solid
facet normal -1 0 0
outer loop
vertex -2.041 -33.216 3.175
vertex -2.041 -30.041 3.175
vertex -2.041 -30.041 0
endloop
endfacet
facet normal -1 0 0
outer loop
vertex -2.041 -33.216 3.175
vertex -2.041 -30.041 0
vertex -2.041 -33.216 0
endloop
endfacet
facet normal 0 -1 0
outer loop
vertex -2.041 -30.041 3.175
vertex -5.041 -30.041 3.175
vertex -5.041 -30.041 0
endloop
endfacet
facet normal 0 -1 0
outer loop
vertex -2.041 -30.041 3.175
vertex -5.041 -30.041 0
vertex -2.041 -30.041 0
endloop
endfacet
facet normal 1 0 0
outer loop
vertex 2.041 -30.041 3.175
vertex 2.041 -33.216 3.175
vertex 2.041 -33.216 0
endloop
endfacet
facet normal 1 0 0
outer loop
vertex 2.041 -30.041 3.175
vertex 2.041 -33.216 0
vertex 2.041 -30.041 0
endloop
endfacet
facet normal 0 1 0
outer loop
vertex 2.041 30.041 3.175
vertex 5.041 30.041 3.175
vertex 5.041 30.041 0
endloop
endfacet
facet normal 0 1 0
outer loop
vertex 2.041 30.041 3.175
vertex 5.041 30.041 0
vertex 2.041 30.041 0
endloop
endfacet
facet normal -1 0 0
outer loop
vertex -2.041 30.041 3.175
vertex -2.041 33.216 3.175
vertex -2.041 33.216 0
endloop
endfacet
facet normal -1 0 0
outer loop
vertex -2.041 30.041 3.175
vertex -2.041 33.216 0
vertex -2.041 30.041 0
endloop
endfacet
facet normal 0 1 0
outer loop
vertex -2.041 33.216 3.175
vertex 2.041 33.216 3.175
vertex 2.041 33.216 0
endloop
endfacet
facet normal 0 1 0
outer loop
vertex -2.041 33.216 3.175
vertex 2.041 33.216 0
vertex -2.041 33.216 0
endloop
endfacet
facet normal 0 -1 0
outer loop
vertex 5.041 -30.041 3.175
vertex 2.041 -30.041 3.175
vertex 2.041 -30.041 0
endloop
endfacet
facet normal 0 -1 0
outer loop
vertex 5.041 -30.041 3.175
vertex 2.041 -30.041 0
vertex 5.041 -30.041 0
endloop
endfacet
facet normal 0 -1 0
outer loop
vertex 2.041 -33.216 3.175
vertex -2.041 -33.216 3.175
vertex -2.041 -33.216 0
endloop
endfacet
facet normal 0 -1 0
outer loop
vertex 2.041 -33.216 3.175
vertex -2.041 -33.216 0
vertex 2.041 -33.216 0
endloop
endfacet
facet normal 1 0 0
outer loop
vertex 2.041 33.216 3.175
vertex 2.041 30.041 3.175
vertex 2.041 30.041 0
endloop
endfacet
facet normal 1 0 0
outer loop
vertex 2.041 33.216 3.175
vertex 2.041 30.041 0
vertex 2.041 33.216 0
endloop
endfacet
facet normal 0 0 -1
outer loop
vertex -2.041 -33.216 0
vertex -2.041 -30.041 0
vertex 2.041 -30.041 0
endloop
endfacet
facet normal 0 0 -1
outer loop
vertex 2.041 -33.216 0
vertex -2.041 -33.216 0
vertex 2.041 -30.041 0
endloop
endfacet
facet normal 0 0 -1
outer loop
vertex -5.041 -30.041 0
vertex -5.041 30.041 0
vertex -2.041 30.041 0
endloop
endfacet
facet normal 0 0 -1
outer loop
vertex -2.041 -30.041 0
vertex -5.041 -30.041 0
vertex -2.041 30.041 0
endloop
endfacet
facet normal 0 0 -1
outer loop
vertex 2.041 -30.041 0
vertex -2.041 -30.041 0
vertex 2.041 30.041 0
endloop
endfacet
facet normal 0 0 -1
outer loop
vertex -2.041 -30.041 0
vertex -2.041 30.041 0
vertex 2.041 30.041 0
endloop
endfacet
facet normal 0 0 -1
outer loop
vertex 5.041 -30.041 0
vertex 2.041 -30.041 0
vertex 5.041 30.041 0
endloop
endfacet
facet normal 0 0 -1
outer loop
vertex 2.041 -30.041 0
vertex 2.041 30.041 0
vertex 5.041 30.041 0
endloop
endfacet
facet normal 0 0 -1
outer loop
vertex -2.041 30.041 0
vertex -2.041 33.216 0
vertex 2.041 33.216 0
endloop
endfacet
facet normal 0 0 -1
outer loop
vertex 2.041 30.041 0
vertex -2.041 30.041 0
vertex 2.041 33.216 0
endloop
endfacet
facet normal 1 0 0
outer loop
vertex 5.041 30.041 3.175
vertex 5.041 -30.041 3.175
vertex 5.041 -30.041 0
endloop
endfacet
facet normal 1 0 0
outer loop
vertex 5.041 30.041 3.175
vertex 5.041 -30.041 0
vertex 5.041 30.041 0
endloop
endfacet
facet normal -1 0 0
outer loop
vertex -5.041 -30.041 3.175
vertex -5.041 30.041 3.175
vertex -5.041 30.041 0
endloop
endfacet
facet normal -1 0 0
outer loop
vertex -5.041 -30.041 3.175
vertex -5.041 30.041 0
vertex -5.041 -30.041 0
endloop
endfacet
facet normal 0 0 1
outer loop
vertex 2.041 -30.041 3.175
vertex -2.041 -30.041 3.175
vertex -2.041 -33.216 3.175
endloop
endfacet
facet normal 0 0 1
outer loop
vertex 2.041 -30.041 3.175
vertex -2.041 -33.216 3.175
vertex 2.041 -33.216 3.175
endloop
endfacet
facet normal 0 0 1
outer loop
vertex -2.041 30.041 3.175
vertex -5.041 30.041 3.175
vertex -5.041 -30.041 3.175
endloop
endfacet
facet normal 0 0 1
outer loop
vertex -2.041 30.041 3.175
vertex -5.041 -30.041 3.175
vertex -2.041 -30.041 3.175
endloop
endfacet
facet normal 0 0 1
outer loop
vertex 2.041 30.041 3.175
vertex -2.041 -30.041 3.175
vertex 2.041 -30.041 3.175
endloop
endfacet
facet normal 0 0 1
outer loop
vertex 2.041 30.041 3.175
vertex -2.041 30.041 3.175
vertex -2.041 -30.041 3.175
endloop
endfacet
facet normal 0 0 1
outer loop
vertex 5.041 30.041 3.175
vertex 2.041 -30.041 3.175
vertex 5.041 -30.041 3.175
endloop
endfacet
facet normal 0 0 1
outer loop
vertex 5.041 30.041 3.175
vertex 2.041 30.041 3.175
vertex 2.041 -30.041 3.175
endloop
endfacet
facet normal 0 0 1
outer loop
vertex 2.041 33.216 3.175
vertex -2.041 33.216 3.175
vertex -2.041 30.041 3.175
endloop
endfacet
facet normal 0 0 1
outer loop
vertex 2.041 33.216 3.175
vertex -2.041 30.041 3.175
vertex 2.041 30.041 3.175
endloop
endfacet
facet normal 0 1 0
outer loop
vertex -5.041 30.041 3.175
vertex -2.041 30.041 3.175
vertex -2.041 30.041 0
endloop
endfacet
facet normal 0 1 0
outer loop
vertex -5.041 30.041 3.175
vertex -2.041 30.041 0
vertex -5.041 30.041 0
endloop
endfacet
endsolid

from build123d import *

# Parameters (mm, degrees)
SKETCH1_W           = 10
SKETCH1_H           = 60
SKETCH1_W_2         = 4
SKETCH1_H_2         = 3.175
BOSS_EXTRUDE1_DEPTH = 3.175
BOSS_EXTRUDE2_DEPTH = 3.175


with BuildPart() as part:
    # Sketch1 → Boss-Extrude1 (new body)
    with BuildSketch(Plane.XY):
        Rectangle(SKETCH1_W, SKETCH1_H)
        with Locations((0, 31.5875)):
            Rectangle(SKETCH1_W_2, SKETCH1_H_2)
        with Locations((0, -31.5875)):
            Rectangle(SKETCH1_W_2, SKETCH1_H_2)
    extrude(amount=BOSS_EXTRUDE1_DEPTH)

    # Sketch2 → Boss-Extrude2 (add)
    with BuildSketch(Plane.XY.offset(3.175)):
        Polygon((5.04064, -30.04064), (5.04064, 30.04064), (2.04064, 30.04064), (2.04064, 33.21564), (-2.04064, 33.21564), (-2.04064, 30.04064), (-5.04064, 30.04064), (-5.04064, -30.04064), (-2.04064, -30.04064), (-2.04064, -33.21564), (2.04064, -33.21564), (2.04064, -30.04064), align=None)
    extrude(amount=-BOSS_EXTRUDE2_DEPTH)


solid = part.part
